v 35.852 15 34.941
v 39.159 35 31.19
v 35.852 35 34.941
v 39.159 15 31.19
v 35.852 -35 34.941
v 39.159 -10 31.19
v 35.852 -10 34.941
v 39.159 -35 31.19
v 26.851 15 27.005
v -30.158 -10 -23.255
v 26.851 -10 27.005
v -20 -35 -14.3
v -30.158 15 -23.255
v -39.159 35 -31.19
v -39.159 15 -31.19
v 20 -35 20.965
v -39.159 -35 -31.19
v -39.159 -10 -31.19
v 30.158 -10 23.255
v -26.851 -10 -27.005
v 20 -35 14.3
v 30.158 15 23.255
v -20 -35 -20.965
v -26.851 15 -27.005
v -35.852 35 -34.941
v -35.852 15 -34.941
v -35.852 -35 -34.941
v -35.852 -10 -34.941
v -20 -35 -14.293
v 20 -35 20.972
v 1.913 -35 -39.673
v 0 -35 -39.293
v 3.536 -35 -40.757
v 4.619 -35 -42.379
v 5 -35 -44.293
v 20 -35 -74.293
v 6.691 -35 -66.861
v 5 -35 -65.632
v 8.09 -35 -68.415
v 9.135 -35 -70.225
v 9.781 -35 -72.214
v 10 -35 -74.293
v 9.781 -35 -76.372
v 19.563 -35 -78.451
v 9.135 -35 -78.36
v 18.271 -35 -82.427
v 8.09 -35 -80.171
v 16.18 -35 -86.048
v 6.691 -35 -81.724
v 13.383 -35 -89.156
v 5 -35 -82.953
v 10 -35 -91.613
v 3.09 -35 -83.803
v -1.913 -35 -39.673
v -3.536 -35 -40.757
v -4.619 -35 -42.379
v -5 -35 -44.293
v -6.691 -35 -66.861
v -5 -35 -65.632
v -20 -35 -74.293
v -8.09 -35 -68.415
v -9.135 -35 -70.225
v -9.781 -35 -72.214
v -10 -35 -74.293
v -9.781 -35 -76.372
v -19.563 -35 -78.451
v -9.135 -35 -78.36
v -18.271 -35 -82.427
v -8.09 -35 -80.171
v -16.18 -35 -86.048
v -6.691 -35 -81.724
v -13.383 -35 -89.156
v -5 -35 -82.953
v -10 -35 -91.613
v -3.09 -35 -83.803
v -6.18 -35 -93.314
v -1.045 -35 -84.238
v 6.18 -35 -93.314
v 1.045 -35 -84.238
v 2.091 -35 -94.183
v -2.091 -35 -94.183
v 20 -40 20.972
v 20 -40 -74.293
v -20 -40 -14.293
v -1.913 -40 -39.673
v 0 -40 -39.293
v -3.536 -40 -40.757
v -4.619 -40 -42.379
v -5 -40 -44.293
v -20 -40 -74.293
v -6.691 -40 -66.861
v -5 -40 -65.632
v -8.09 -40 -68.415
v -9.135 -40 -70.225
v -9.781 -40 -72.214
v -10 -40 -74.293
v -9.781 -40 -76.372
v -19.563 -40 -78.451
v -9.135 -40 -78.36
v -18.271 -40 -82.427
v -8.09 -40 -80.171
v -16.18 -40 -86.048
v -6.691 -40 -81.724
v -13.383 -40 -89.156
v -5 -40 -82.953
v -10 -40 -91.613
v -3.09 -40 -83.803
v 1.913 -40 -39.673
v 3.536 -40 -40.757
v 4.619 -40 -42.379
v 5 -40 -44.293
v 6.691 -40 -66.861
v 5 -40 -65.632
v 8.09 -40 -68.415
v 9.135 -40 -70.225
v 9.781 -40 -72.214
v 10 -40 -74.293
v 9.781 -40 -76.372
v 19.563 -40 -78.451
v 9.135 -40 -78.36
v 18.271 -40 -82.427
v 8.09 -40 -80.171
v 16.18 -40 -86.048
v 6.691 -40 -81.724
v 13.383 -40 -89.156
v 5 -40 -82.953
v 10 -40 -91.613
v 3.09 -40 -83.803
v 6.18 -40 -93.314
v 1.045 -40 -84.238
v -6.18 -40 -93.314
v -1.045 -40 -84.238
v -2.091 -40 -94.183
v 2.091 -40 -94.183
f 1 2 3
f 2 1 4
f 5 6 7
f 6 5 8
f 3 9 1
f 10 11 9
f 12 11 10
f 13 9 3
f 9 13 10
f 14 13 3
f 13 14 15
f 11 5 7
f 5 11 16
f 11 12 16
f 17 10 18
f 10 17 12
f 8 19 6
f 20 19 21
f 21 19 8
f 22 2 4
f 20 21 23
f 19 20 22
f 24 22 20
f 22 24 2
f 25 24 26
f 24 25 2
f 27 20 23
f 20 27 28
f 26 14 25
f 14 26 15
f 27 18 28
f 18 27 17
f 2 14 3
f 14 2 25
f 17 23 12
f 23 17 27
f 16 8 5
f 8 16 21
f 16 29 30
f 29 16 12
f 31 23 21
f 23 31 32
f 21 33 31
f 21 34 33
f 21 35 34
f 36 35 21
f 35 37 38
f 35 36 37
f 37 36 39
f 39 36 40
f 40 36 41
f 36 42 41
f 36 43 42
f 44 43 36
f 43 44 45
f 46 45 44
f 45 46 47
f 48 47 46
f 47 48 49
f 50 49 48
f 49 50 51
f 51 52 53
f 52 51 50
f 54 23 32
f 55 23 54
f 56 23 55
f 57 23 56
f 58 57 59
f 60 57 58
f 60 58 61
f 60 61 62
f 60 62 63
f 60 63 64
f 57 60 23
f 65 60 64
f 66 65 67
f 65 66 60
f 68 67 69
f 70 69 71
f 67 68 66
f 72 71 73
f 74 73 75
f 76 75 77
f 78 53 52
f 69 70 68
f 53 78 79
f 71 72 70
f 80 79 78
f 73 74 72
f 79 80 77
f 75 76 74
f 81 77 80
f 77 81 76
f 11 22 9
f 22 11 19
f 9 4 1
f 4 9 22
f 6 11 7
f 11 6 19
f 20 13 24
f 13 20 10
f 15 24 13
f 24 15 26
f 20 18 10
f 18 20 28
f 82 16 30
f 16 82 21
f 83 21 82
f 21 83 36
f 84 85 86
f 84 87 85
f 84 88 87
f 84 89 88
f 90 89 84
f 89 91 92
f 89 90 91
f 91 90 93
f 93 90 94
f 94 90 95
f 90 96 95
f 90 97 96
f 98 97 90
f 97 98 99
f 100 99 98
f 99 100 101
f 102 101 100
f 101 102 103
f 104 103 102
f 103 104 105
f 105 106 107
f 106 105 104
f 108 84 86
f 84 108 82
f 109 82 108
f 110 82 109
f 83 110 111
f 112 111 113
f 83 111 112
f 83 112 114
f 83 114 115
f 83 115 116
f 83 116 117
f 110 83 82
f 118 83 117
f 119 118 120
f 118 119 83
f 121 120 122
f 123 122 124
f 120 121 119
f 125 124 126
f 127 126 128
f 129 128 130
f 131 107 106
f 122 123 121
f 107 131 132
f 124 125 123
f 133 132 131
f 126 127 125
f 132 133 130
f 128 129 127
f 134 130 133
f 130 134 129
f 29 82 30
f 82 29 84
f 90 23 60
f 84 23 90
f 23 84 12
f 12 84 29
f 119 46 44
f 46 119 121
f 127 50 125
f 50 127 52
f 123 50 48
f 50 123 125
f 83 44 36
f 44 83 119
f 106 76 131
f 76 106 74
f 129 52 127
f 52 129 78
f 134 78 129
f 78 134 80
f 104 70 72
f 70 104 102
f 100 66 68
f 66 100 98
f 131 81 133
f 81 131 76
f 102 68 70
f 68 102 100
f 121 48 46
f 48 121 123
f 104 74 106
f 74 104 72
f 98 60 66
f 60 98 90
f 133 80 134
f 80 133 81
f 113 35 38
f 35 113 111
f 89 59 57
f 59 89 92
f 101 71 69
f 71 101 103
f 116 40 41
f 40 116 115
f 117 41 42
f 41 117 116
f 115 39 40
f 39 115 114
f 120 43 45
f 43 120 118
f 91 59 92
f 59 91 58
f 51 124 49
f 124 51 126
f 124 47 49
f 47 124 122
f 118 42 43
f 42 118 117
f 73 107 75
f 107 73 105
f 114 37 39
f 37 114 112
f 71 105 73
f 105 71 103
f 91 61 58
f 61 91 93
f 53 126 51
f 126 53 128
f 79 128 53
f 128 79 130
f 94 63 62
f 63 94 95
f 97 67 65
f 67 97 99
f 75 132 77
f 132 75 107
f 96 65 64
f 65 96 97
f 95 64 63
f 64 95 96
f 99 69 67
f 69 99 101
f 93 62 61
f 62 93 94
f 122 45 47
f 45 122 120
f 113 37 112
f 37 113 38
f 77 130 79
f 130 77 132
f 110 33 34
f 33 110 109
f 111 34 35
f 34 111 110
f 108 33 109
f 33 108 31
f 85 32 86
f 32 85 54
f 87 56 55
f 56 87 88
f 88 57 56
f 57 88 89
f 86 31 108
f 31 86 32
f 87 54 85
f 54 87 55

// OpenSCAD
/**
 * MIT License
 *
 * Copyright (c) 2026 Adam Kuczyński
 *
 * Permission is hereby granted, free of charge, to any person obtaining a copy
 * of this software and associated documentation files (the "Software"), to deal
 * in the Software without restriction, including without limitation the rights
 * to use, copy, modify, merge, publish, distribute, sublicense, and/or sell
 * copies of the Software, and to permit persons to whom the Software is
 * furnished to do so, subject to the following conditions:
 *
 * The above copyright notice and this permission notice shall be included in all
 * copies or substantial portions of the Software.
 *
 * THE SOFTWARE IS PROVIDED "AS IS", WITHOUT WARRANTY OF ANY KIND, EXPRESS OR
 * IMPLIED, INCLUDING BUT NOT LIMITED TO THE WARRANTIES OF MERCHANTABILITY,
 * FITNESS FOR A PARTICULAR PURPOSE AND NONINFRINGEMENT. IN NO EVENT SHALL THE
 * AUTHORS OR COPYRIGHT HOLDERS BE LIABLE FOR ANY CLAIM, DAMAGES OR OTHER
 * LIABILITY, WHETHER IN AN ACTION OF CONTRACT, TORT OR OTHERWISE, ARISING FROM,
 * OUT OF OR IN CONNECTION WITH THE SOFTWARE OR THE USE OR OTHER DEALINGS IN THE
 * SOFTWARE.
 */

union($fn = 100) {
    rotate([0, -41.4, 0])
        difference() {
            cube([100, 70, 5], center = true);
            translate([44, 2.5, 0])
                cube([12, 25, 5], center = true);
            translate([-44, 2.5, 0])
                cube([12, 25, 5], center = true);
        }
    translate([0, -37.5, -(48.5-4.2073)])
        rotate([90, 0, 0])
            difference() {
                union() {
                    cube([40, 60, 5], center = true);
                    translate([0, -30, 0])
                        cylinder(h = 5, d = 40, center = true);
                    translate([-20, 30, -2.5])
                    intersection() {
                        cube([40, 66, 5]);
                        rotate_extrude(angle = 41.4)
                            square([60, 5]);
                    }
                }
                translate([0, -15, 0])
                union() {
                    cube([10, 30, 5], center = true);
                    translate([0, -15, 0])
                        cylinder(h = 5, d = 20, center = true);
                    translate([0, 15, 0])
                        cylinder(h = 5, d = 10, center = true);
                }
            }
}
